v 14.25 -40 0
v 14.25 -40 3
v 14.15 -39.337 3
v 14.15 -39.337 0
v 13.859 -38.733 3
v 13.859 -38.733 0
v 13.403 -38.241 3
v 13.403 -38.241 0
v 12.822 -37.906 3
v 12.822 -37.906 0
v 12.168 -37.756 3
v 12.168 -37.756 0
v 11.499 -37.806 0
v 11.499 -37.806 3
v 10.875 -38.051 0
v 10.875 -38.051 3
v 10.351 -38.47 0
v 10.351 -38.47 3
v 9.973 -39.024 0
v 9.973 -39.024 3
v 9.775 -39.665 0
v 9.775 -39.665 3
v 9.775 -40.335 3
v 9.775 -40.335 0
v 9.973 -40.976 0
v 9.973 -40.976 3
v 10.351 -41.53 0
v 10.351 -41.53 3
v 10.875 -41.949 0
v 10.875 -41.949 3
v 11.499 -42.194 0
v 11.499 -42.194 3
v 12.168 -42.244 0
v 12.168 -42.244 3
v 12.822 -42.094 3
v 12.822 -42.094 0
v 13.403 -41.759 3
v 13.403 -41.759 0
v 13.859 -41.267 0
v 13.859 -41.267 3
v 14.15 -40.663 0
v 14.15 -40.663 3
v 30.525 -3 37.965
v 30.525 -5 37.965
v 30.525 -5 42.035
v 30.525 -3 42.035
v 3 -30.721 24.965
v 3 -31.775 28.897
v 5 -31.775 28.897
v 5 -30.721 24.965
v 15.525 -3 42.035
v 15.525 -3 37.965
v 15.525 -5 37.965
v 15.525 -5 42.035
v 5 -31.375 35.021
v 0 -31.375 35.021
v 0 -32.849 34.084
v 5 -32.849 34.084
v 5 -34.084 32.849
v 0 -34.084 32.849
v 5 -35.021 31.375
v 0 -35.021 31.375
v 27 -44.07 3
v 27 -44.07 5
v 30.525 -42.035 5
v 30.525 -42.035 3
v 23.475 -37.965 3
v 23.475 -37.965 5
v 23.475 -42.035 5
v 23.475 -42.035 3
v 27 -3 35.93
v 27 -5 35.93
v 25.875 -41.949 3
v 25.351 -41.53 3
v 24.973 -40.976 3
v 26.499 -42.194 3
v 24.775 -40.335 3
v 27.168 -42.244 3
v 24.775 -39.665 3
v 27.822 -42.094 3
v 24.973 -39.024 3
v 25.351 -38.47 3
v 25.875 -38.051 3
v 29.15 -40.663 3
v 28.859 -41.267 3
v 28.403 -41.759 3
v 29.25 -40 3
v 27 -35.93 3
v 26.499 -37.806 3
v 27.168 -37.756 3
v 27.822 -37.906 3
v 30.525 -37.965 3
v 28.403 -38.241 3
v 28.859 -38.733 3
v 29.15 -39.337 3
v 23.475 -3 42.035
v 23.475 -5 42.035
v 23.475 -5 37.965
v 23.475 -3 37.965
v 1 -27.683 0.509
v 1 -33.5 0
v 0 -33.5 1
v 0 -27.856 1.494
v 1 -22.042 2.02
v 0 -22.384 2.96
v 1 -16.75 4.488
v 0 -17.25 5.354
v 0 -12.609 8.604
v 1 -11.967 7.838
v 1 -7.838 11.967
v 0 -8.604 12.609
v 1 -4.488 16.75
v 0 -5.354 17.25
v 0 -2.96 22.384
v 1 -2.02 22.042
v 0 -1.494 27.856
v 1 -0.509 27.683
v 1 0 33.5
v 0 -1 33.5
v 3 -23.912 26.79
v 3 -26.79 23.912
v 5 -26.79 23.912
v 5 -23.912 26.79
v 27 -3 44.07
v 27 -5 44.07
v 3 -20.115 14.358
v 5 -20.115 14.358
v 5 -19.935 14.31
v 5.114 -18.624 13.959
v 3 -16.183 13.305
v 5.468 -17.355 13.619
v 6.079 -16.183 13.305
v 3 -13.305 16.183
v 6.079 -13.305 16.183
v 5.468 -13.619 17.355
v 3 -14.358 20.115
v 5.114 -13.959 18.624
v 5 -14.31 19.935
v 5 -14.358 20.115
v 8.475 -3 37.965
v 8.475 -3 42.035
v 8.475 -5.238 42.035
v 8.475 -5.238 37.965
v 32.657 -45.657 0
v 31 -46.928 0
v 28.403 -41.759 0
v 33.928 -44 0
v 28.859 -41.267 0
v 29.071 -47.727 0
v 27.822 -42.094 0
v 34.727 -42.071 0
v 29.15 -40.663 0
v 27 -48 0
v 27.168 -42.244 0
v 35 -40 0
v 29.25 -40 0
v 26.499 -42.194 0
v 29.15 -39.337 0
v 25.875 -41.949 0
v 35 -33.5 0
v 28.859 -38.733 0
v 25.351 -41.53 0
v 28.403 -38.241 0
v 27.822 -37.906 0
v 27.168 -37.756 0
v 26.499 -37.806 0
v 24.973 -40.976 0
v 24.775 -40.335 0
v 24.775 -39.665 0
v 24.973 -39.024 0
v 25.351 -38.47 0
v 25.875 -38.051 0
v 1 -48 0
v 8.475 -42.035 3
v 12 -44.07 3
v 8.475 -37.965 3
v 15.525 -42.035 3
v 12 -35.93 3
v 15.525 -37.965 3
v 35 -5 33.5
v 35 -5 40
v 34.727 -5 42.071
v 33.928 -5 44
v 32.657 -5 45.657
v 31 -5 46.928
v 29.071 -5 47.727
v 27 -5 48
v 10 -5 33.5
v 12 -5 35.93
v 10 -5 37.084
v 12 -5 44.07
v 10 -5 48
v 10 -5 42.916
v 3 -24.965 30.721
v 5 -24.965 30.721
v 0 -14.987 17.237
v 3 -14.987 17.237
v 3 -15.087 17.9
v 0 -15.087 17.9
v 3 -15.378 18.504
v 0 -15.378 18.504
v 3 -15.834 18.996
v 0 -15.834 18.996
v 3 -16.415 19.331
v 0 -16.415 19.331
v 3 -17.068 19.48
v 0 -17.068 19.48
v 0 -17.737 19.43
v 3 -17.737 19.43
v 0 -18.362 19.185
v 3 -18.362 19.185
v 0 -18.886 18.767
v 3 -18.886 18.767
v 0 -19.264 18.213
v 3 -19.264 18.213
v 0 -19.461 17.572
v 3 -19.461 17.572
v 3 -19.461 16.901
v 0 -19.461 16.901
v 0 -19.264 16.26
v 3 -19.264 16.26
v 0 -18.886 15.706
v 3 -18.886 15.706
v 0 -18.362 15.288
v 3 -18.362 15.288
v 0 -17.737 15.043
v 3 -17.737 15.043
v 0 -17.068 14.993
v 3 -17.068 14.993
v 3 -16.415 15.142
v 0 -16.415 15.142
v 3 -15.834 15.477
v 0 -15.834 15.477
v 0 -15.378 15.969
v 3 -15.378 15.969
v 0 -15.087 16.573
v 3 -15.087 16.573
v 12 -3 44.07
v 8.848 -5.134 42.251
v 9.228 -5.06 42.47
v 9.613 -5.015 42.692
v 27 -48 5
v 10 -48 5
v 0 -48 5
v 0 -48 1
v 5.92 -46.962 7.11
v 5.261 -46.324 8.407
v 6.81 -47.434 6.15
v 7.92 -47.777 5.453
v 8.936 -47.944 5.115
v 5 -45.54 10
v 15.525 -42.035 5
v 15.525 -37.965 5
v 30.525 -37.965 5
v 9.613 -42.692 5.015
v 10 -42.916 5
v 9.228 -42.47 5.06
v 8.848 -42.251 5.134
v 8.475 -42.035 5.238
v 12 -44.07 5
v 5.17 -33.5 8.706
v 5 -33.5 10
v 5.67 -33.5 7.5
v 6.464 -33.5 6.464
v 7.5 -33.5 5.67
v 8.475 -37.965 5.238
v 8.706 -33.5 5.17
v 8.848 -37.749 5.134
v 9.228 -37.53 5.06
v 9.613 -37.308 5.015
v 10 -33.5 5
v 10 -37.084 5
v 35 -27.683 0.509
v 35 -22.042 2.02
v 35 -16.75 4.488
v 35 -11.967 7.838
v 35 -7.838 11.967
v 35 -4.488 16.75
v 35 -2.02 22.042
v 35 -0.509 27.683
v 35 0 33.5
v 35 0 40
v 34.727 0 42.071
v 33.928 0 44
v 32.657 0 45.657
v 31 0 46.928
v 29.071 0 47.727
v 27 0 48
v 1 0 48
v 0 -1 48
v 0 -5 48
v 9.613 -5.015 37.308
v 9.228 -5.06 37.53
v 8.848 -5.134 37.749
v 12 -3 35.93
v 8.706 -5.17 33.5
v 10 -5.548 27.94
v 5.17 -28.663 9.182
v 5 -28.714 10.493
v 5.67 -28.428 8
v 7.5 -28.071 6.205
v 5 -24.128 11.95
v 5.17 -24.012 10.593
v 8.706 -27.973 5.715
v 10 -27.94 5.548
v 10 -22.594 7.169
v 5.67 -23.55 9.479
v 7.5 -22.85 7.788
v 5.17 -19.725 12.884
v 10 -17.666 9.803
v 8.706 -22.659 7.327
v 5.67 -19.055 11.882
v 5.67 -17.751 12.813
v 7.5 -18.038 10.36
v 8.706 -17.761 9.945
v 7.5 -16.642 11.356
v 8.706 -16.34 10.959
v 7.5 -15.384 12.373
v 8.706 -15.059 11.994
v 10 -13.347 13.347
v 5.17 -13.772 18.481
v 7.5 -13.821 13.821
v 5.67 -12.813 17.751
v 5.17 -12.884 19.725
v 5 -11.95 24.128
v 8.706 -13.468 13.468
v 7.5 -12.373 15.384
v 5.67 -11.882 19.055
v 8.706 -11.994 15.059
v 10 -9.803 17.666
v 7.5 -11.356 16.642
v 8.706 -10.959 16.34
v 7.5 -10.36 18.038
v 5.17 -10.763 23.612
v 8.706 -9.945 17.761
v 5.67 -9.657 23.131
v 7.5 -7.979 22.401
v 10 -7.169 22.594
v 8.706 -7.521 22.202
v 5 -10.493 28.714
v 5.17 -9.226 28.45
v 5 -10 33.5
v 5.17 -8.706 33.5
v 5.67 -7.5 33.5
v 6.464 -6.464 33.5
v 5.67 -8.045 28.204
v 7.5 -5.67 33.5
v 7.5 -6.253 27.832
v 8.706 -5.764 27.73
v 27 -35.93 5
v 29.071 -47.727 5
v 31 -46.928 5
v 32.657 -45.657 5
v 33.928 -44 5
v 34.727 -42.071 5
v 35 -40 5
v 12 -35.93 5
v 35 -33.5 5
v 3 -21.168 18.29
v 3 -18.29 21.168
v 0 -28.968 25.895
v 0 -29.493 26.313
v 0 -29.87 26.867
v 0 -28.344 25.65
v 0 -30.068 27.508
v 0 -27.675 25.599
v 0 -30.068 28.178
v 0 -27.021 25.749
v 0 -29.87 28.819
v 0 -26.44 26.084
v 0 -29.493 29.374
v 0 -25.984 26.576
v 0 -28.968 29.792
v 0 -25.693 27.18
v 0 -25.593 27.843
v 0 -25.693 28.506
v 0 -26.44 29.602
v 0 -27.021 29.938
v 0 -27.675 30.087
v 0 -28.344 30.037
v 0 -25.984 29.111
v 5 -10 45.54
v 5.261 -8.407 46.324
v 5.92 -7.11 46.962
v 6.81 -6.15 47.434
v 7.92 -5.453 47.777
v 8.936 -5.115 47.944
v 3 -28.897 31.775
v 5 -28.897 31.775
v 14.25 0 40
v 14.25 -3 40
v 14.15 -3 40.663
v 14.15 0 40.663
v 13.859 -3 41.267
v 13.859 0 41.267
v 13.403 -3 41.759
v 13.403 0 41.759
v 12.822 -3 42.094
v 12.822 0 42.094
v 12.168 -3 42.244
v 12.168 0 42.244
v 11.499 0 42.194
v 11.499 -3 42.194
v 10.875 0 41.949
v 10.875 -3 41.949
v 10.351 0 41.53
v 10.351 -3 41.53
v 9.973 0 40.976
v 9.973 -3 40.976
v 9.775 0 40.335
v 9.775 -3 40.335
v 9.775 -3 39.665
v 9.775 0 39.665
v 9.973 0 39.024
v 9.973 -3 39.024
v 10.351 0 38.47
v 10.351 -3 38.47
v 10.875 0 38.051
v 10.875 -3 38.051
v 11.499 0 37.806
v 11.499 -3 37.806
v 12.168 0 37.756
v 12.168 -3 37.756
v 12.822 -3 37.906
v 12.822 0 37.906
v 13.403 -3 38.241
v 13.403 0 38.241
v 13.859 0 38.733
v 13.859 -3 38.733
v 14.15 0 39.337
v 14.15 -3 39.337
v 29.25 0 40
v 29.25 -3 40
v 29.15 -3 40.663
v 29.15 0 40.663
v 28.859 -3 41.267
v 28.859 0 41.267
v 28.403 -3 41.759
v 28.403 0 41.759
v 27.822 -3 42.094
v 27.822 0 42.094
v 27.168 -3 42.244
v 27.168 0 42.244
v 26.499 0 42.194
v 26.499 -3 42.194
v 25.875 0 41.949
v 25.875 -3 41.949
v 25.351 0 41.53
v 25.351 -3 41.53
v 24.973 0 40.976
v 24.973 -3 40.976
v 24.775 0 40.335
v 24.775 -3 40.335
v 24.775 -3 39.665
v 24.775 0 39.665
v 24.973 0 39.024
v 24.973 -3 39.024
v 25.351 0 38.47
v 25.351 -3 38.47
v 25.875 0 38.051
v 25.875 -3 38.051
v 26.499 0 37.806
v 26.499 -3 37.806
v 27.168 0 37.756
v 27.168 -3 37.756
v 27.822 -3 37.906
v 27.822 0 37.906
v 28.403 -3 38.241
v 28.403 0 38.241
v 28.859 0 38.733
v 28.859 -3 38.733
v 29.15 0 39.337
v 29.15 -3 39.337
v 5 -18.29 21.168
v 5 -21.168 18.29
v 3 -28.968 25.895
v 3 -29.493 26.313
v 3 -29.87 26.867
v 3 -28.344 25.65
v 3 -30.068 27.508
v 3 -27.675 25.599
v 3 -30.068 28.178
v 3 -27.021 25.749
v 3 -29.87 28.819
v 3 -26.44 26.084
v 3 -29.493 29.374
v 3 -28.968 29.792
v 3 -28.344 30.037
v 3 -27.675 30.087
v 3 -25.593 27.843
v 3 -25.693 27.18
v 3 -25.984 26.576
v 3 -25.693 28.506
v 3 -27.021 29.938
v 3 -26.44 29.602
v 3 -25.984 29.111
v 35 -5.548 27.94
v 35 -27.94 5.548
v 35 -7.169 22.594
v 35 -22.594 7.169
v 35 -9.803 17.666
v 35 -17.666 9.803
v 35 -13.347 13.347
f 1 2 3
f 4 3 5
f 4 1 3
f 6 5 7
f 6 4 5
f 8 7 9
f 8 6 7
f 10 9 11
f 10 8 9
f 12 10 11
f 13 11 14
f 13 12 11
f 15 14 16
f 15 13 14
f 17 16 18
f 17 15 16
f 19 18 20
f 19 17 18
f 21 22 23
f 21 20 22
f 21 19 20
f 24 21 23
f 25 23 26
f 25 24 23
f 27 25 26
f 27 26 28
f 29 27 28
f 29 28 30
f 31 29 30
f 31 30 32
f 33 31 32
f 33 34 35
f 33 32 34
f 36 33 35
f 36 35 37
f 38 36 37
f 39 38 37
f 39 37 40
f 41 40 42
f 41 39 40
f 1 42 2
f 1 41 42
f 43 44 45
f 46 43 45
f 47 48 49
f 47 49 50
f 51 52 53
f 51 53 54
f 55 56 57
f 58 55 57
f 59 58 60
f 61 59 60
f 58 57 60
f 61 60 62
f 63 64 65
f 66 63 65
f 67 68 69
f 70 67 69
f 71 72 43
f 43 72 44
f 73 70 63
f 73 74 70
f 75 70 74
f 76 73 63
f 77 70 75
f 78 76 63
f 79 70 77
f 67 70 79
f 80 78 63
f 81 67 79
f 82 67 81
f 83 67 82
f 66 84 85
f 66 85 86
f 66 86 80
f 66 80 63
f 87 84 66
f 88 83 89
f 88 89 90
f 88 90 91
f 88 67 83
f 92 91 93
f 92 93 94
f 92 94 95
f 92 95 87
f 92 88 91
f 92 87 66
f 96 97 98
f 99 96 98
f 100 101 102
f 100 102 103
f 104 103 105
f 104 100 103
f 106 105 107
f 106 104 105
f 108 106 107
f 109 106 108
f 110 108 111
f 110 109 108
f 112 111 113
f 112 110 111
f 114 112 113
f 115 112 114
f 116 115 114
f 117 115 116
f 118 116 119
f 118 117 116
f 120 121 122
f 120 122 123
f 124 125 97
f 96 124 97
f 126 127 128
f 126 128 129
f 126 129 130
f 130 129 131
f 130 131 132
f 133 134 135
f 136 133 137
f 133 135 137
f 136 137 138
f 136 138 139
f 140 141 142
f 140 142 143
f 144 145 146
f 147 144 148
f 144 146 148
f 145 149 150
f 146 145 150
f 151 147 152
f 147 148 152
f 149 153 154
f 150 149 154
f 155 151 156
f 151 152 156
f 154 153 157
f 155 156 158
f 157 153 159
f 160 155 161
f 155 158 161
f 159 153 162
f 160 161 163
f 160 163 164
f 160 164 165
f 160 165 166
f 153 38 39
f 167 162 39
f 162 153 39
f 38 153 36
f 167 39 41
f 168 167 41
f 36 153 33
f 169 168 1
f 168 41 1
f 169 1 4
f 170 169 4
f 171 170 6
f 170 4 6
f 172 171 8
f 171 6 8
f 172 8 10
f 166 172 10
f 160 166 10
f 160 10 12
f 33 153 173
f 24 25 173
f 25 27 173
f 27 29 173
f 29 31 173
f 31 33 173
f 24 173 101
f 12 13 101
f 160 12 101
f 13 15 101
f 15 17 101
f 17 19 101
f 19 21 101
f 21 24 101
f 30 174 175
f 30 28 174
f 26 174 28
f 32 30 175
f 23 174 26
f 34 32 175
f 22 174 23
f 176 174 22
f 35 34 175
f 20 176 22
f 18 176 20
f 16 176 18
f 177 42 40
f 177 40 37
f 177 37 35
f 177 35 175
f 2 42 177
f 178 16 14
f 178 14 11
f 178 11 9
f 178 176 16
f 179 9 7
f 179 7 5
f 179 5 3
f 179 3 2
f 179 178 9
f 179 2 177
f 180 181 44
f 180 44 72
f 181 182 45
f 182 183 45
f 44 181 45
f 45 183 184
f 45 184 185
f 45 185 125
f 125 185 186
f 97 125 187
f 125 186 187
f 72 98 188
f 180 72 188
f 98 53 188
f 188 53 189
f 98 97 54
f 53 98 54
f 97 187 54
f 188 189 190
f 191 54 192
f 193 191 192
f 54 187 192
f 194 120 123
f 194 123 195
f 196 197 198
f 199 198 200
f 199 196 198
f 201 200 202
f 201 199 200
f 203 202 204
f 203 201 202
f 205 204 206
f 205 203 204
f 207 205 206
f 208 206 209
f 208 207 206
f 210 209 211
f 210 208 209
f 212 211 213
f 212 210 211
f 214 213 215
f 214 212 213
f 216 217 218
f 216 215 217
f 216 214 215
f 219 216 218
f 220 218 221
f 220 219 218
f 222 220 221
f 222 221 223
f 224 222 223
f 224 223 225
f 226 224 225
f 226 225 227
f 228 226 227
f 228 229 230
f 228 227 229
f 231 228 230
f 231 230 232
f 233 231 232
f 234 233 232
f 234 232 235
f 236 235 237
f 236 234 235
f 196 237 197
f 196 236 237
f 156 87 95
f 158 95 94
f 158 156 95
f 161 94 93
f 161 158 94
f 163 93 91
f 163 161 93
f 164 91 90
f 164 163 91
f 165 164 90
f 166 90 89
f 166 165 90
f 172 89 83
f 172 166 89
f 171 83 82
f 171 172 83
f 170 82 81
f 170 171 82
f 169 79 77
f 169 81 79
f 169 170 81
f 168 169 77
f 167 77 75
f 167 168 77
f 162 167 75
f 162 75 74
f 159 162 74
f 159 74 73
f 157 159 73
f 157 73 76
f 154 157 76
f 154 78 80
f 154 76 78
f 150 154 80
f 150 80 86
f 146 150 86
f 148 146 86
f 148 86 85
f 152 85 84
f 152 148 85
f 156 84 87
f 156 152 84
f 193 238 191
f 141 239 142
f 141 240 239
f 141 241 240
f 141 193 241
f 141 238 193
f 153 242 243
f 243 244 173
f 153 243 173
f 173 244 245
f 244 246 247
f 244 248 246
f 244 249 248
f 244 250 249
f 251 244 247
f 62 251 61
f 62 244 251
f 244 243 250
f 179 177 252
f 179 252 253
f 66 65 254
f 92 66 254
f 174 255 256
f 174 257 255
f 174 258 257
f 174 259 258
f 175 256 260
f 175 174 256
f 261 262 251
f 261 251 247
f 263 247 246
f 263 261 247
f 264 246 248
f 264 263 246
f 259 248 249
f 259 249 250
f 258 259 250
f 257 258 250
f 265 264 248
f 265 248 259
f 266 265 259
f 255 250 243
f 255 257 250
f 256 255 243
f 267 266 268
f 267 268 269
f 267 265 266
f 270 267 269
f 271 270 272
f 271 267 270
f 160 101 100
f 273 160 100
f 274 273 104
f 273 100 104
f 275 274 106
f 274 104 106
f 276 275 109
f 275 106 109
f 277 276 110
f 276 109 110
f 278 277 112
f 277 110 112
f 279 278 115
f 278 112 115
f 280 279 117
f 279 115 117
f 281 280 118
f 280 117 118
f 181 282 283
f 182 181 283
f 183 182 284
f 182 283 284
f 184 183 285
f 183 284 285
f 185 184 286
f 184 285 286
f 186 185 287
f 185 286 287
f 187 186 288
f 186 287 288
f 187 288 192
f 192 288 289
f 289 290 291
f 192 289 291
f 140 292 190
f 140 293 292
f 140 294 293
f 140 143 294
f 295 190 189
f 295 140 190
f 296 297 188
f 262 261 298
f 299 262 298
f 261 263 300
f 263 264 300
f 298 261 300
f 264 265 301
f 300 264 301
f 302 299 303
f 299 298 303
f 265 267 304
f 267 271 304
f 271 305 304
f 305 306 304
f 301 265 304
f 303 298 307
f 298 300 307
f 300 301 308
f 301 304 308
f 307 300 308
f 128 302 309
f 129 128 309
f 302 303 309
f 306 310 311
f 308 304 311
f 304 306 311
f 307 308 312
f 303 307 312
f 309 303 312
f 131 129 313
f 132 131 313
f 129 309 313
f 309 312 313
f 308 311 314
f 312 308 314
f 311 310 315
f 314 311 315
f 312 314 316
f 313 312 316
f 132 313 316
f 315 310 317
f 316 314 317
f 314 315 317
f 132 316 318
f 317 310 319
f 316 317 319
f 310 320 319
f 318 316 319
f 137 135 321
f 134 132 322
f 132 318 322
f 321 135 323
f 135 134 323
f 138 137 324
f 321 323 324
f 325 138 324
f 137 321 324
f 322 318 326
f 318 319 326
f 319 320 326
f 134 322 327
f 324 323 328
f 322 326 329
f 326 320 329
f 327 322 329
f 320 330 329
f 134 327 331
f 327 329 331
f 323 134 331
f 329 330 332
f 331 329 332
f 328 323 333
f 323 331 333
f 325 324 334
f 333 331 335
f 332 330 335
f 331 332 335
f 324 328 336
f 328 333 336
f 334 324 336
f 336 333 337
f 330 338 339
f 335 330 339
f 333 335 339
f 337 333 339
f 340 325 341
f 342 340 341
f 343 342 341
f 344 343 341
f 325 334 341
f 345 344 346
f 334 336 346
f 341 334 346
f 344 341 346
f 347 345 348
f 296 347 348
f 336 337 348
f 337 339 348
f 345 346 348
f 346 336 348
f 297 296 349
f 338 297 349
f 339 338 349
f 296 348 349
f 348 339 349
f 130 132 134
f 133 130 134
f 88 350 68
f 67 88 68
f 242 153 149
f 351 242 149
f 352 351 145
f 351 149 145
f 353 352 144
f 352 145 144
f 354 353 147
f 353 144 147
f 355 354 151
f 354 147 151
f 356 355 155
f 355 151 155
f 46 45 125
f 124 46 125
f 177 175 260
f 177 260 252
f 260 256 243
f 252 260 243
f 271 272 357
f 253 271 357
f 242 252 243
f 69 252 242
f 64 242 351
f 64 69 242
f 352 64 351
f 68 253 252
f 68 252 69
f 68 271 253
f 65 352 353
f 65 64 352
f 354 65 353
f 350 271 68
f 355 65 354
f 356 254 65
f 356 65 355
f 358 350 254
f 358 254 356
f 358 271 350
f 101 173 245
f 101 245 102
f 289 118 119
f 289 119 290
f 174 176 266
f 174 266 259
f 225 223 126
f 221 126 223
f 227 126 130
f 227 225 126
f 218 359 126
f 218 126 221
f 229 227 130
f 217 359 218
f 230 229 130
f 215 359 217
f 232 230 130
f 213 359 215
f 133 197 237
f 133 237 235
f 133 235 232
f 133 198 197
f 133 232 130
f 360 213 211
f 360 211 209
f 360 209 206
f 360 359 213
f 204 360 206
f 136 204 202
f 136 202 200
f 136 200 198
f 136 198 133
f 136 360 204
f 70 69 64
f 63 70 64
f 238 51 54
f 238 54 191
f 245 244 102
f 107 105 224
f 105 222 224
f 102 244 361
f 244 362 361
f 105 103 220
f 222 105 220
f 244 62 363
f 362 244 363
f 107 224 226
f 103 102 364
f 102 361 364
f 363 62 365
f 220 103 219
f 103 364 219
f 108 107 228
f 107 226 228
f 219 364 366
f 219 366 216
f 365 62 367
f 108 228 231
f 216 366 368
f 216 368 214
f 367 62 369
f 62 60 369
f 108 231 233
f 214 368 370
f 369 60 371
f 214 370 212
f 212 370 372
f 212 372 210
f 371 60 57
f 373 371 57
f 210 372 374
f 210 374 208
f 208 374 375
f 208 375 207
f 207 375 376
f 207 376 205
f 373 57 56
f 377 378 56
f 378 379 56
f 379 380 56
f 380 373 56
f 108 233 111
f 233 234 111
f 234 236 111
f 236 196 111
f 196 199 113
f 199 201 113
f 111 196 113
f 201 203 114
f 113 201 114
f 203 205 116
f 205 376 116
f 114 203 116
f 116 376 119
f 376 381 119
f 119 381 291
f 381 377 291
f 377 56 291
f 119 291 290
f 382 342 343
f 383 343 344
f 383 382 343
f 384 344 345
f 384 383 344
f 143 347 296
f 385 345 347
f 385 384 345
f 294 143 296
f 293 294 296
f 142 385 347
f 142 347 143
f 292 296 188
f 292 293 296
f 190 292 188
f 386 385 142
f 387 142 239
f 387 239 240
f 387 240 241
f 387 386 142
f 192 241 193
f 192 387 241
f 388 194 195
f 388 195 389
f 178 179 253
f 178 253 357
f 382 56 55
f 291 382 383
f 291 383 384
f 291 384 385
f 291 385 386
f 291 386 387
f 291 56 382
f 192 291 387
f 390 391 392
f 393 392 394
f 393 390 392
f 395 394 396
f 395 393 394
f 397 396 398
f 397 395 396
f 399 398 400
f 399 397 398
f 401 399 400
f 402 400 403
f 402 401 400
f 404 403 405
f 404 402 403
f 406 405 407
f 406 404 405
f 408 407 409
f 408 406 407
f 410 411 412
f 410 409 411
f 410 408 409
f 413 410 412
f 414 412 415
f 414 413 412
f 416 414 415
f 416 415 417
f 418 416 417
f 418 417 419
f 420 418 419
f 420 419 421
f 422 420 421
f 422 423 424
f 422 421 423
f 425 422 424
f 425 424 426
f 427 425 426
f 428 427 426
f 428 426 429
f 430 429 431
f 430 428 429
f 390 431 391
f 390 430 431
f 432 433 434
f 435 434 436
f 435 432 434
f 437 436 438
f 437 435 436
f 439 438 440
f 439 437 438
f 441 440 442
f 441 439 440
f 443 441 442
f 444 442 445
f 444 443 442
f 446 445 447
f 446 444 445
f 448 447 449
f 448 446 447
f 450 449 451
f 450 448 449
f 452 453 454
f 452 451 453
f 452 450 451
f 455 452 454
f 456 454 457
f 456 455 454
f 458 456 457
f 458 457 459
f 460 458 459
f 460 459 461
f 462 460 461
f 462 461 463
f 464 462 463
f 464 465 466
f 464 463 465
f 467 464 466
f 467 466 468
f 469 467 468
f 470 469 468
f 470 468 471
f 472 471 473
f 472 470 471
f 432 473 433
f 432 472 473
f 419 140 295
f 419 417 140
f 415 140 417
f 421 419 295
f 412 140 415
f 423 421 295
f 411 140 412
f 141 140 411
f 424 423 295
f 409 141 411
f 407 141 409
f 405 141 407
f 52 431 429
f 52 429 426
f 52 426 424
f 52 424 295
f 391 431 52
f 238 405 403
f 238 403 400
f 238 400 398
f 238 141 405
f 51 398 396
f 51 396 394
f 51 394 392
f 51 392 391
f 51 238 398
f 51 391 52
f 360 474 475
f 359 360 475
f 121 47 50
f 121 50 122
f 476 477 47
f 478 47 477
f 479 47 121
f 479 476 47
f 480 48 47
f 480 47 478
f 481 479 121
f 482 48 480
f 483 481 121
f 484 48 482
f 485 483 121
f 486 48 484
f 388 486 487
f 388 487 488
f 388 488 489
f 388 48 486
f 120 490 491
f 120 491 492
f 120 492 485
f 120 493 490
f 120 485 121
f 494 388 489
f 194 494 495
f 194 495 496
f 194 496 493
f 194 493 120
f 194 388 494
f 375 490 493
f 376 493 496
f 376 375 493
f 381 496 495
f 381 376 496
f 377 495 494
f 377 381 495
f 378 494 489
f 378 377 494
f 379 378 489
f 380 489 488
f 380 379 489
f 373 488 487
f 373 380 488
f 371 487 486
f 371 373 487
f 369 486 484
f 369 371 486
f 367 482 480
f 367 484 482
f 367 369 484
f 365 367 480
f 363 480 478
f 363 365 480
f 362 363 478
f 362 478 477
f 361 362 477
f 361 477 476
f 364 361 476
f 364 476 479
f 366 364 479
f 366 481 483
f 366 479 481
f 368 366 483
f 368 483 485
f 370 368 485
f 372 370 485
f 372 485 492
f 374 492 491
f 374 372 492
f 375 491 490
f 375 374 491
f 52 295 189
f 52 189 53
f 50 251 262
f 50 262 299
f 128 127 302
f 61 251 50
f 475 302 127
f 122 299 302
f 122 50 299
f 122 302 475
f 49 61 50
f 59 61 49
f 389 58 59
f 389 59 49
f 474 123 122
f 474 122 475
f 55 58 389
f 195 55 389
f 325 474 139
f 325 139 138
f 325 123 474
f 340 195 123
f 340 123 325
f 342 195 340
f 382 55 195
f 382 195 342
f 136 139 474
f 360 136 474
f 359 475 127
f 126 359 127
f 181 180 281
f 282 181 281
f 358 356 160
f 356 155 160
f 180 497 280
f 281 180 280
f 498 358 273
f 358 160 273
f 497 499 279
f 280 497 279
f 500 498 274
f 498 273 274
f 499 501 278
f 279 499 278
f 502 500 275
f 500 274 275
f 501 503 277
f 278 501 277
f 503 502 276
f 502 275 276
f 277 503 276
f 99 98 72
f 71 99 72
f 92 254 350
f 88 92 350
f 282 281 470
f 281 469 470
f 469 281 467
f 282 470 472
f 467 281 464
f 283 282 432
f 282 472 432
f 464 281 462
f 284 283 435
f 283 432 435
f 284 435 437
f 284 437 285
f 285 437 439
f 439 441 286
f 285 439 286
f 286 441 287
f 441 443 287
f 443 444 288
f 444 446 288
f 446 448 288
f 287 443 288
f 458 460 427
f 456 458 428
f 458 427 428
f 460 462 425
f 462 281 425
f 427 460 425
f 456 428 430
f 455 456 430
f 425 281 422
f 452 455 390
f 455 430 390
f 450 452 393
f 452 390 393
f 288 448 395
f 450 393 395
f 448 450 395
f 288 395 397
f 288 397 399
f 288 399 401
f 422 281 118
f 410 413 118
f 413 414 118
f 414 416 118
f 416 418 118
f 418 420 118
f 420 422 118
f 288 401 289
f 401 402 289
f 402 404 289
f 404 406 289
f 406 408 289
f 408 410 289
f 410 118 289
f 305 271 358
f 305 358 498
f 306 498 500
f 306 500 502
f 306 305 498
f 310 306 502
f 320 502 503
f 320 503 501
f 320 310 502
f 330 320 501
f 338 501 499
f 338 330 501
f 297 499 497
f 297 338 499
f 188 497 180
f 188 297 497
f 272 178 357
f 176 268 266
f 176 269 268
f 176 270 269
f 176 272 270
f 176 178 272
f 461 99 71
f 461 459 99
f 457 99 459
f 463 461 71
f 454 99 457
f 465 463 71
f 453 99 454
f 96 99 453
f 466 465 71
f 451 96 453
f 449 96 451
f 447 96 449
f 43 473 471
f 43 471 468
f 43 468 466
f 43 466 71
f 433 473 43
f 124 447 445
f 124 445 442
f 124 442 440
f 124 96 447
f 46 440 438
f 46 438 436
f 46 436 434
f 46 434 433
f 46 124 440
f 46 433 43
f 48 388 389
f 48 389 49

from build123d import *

# Parameters (mm, degrees)
PAD_DEPTH       = 5
PAD001_DEPTH    = 5
PAD002_DEPTH    = 5
FILLET003_R     = 28.5
POCKET003_DEPTH = 35.001
FILLET_R        = 5
SKETCH003_R     = 2.25
HOLE_DEPTH      = 48.001
SKETCH004_R     = 2.25
HOLE001_DEPTH   = 35.001
SKETCH005_R     = 2.25
HOLE002_DEPTH   = 48.001
POCKET_DEPTH    = 2
POCKET001_DEPTH = 2
POCKET002_DEPTH = 2
CHAMFER_SIZE    = 1


with BuildPart() as part:
    # Sketch → Pad (new body)
    with BuildSketch(Plane.YZ):
        with BuildLine():
            Line((0, 48), (-5, 48))
            Line((-31.37532, 35.02115), (-5, 48))
            ThreePointArc((-31.37532, 35.02115), (-33.5, 33.5), (-35.02115, 31.37532))
            Line((-48, 5), (-35.02115, 31.37532))
            Line((-48, 5), (-48, 0))
            Line((-48, 0), (0, 0))
            Line((0, 0), (0, 48))
        make_face()
    extrude(amount=PAD_DEPTH)

    # Sketch001 → Pad001 (join)
    with BuildSketch(Plane.XY):
        with BuildLine():
            Line((0, 0), (0, -48))
            Line((0, -48), (27, -48))
            ThreePointArc((27, -48), (32.656854, -45.656854), (35, -40))
            Line((35, -40), (35, 0))
            Line((35, 0), (0, 0))
        make_face()
    extrude(amount=PAD001_DEPTH)

    # Sketch002 (on DatumPlane) → Pad002 (join)
    with BuildSketch(Plane.XZ):
        with BuildLine():
            Line((0, 0), (0, 48))
            Line((0, 48), (27, 48))
            ThreePointArc((35, 40), (32.656854, 45.656854), (27, 48))
            Line((35, 40), (35, 0))
            Line((35, 0), (0, 0))
        make_face()
    extrude(amount=PAD002_DEPTH)

    # Fillet003
    fillet003_edges = [part.edges().sort_by_distance(p)[0] for p in [
        (20, -5, 5),
    ]]
    fillet(fillet003_edges, radius=FILLET003_R)

    # Sketch009 → Pocket003 (cut, through all)
    with BuildSketch(Plane.YZ):
        with BuildLine():
            ThreePointArc((-33.5, 0), (-9.811923, 9.811923), (0, 33.5))
            Line((0, 33.5), (0, 0))
            Line((-33.5, 0), (0, 0))
        make_face()
    extrude(amount=POCKET003_DEPTH, mode=Mode.SUBTRACT)

    # Fillet
    fillet_edges = [part.edges().sort_by_distance(p)[0] for p in [
        (5, -13.347457, 13.347457),
    ]]
    fillet(fillet_edges, radius=FILLET_R)

    # Sketch003 → Hole (cut, through all)
    with BuildSketch(Plane.XY):
        with Locations((12, -40)):
            Circle(SKETCH003_R)
        with Locations((27, -40)):
            Circle(SKETCH003_R)
    extrude(amount=HOLE_DEPTH, mode=Mode.SUBTRACT)

    # Sketch004 → Hole001 (cut, through all)
    with BuildSketch(Plane.YZ):
        with Locations((-17.236544, 17.236544)):
            Circle(SKETCH004_R)
        with Locations((-27.843146, 27.843146)):
            Circle(SKETCH004_R)
    extrude(amount=HOLE001_DEPTH, mode=Mode.SUBTRACT)

    # Sketch005 (on DatumPlane) → Hole002 (cut, through all)
    with BuildSketch(Plane.XZ):
        with Locations((12, 40)):
            Circle(SKETCH005_R)
        with Locations((27, 40)):
            Circle(SKETCH005_R)
    extrude(amount=HOLE002_DEPTH, mode=Mode.SUBTRACT)

    # Sketch006 (on DatumPlane) → Pocket (cut, symmetric)
    with BuildSketch(Plane.XY.offset(5)):
        Polygon((12, -44.070319), (15.525, -42.03516), (15.525, -37.96484), (12, -35.929681), (8.475, -37.96484), (8.475, -42.03516), align=None)
        Polygon((30.525, -42.03516), (30.525, -37.96484), (27, -35.929681), (23.475, -37.96484), (23.475, -42.03516), (27, -44.070319), align=None)
    extrude(amount=POCKET_DEPTH, both=True, mode=Mode.SUBTRACT)

    # Sketch007 (on DatumPlane) → Pocket001 (cut, symmetric)
    with BuildSketch(Plane.YZ.offset(5)):
        Polygon((-31.774772, 28.896622), (-30.721296, 24.964995), (-26.78967, 23.911519), (-23.911519, 26.78967), (-24.964995, 30.721296), (-28.896622, 31.774772), align=None)
        Polygon((-21.168171, 18.29002), (-20.114694, 14.358394), (-16.183068, 13.304917), (-13.304917, 16.183068), (-14.358394, 20.114694), (-18.29002, 21.168171), align=None)
    extrude(amount=POCKET001_DEPTH, both=True, mode=Mode.SUBTRACT)

    # Sketch008 (on DatumPlane) → Pocket002 (cut, symmetric)
    with BuildSketch(Plane.XZ.offset(5)):
        Polygon((12, 35.929681), (15.525, 37.96484), (15.525, 42.03516), (12, 44.070319), (8.475, 42.03516), (8.475, 37.96484), align=None)
        Polygon((27, 35.929681), (30.525, 37.96484), (30.525, 42.03516), (27, 44.070319), (23.475, 42.03516), (23.475, 37.96484), align=None)
    extrude(amount=POCKET002_DEPTH, both=True, mode=Mode.SUBTRACT)

    # Chamfer
    chamfer_edges = [part.edges().sort_by_distance(p)[0] for p in [
        (0, -9.811923, 9.811923),
    ]]
    chamfer(chamfer_edges, length=CHAMFER_SIZE)


solid = part.part
